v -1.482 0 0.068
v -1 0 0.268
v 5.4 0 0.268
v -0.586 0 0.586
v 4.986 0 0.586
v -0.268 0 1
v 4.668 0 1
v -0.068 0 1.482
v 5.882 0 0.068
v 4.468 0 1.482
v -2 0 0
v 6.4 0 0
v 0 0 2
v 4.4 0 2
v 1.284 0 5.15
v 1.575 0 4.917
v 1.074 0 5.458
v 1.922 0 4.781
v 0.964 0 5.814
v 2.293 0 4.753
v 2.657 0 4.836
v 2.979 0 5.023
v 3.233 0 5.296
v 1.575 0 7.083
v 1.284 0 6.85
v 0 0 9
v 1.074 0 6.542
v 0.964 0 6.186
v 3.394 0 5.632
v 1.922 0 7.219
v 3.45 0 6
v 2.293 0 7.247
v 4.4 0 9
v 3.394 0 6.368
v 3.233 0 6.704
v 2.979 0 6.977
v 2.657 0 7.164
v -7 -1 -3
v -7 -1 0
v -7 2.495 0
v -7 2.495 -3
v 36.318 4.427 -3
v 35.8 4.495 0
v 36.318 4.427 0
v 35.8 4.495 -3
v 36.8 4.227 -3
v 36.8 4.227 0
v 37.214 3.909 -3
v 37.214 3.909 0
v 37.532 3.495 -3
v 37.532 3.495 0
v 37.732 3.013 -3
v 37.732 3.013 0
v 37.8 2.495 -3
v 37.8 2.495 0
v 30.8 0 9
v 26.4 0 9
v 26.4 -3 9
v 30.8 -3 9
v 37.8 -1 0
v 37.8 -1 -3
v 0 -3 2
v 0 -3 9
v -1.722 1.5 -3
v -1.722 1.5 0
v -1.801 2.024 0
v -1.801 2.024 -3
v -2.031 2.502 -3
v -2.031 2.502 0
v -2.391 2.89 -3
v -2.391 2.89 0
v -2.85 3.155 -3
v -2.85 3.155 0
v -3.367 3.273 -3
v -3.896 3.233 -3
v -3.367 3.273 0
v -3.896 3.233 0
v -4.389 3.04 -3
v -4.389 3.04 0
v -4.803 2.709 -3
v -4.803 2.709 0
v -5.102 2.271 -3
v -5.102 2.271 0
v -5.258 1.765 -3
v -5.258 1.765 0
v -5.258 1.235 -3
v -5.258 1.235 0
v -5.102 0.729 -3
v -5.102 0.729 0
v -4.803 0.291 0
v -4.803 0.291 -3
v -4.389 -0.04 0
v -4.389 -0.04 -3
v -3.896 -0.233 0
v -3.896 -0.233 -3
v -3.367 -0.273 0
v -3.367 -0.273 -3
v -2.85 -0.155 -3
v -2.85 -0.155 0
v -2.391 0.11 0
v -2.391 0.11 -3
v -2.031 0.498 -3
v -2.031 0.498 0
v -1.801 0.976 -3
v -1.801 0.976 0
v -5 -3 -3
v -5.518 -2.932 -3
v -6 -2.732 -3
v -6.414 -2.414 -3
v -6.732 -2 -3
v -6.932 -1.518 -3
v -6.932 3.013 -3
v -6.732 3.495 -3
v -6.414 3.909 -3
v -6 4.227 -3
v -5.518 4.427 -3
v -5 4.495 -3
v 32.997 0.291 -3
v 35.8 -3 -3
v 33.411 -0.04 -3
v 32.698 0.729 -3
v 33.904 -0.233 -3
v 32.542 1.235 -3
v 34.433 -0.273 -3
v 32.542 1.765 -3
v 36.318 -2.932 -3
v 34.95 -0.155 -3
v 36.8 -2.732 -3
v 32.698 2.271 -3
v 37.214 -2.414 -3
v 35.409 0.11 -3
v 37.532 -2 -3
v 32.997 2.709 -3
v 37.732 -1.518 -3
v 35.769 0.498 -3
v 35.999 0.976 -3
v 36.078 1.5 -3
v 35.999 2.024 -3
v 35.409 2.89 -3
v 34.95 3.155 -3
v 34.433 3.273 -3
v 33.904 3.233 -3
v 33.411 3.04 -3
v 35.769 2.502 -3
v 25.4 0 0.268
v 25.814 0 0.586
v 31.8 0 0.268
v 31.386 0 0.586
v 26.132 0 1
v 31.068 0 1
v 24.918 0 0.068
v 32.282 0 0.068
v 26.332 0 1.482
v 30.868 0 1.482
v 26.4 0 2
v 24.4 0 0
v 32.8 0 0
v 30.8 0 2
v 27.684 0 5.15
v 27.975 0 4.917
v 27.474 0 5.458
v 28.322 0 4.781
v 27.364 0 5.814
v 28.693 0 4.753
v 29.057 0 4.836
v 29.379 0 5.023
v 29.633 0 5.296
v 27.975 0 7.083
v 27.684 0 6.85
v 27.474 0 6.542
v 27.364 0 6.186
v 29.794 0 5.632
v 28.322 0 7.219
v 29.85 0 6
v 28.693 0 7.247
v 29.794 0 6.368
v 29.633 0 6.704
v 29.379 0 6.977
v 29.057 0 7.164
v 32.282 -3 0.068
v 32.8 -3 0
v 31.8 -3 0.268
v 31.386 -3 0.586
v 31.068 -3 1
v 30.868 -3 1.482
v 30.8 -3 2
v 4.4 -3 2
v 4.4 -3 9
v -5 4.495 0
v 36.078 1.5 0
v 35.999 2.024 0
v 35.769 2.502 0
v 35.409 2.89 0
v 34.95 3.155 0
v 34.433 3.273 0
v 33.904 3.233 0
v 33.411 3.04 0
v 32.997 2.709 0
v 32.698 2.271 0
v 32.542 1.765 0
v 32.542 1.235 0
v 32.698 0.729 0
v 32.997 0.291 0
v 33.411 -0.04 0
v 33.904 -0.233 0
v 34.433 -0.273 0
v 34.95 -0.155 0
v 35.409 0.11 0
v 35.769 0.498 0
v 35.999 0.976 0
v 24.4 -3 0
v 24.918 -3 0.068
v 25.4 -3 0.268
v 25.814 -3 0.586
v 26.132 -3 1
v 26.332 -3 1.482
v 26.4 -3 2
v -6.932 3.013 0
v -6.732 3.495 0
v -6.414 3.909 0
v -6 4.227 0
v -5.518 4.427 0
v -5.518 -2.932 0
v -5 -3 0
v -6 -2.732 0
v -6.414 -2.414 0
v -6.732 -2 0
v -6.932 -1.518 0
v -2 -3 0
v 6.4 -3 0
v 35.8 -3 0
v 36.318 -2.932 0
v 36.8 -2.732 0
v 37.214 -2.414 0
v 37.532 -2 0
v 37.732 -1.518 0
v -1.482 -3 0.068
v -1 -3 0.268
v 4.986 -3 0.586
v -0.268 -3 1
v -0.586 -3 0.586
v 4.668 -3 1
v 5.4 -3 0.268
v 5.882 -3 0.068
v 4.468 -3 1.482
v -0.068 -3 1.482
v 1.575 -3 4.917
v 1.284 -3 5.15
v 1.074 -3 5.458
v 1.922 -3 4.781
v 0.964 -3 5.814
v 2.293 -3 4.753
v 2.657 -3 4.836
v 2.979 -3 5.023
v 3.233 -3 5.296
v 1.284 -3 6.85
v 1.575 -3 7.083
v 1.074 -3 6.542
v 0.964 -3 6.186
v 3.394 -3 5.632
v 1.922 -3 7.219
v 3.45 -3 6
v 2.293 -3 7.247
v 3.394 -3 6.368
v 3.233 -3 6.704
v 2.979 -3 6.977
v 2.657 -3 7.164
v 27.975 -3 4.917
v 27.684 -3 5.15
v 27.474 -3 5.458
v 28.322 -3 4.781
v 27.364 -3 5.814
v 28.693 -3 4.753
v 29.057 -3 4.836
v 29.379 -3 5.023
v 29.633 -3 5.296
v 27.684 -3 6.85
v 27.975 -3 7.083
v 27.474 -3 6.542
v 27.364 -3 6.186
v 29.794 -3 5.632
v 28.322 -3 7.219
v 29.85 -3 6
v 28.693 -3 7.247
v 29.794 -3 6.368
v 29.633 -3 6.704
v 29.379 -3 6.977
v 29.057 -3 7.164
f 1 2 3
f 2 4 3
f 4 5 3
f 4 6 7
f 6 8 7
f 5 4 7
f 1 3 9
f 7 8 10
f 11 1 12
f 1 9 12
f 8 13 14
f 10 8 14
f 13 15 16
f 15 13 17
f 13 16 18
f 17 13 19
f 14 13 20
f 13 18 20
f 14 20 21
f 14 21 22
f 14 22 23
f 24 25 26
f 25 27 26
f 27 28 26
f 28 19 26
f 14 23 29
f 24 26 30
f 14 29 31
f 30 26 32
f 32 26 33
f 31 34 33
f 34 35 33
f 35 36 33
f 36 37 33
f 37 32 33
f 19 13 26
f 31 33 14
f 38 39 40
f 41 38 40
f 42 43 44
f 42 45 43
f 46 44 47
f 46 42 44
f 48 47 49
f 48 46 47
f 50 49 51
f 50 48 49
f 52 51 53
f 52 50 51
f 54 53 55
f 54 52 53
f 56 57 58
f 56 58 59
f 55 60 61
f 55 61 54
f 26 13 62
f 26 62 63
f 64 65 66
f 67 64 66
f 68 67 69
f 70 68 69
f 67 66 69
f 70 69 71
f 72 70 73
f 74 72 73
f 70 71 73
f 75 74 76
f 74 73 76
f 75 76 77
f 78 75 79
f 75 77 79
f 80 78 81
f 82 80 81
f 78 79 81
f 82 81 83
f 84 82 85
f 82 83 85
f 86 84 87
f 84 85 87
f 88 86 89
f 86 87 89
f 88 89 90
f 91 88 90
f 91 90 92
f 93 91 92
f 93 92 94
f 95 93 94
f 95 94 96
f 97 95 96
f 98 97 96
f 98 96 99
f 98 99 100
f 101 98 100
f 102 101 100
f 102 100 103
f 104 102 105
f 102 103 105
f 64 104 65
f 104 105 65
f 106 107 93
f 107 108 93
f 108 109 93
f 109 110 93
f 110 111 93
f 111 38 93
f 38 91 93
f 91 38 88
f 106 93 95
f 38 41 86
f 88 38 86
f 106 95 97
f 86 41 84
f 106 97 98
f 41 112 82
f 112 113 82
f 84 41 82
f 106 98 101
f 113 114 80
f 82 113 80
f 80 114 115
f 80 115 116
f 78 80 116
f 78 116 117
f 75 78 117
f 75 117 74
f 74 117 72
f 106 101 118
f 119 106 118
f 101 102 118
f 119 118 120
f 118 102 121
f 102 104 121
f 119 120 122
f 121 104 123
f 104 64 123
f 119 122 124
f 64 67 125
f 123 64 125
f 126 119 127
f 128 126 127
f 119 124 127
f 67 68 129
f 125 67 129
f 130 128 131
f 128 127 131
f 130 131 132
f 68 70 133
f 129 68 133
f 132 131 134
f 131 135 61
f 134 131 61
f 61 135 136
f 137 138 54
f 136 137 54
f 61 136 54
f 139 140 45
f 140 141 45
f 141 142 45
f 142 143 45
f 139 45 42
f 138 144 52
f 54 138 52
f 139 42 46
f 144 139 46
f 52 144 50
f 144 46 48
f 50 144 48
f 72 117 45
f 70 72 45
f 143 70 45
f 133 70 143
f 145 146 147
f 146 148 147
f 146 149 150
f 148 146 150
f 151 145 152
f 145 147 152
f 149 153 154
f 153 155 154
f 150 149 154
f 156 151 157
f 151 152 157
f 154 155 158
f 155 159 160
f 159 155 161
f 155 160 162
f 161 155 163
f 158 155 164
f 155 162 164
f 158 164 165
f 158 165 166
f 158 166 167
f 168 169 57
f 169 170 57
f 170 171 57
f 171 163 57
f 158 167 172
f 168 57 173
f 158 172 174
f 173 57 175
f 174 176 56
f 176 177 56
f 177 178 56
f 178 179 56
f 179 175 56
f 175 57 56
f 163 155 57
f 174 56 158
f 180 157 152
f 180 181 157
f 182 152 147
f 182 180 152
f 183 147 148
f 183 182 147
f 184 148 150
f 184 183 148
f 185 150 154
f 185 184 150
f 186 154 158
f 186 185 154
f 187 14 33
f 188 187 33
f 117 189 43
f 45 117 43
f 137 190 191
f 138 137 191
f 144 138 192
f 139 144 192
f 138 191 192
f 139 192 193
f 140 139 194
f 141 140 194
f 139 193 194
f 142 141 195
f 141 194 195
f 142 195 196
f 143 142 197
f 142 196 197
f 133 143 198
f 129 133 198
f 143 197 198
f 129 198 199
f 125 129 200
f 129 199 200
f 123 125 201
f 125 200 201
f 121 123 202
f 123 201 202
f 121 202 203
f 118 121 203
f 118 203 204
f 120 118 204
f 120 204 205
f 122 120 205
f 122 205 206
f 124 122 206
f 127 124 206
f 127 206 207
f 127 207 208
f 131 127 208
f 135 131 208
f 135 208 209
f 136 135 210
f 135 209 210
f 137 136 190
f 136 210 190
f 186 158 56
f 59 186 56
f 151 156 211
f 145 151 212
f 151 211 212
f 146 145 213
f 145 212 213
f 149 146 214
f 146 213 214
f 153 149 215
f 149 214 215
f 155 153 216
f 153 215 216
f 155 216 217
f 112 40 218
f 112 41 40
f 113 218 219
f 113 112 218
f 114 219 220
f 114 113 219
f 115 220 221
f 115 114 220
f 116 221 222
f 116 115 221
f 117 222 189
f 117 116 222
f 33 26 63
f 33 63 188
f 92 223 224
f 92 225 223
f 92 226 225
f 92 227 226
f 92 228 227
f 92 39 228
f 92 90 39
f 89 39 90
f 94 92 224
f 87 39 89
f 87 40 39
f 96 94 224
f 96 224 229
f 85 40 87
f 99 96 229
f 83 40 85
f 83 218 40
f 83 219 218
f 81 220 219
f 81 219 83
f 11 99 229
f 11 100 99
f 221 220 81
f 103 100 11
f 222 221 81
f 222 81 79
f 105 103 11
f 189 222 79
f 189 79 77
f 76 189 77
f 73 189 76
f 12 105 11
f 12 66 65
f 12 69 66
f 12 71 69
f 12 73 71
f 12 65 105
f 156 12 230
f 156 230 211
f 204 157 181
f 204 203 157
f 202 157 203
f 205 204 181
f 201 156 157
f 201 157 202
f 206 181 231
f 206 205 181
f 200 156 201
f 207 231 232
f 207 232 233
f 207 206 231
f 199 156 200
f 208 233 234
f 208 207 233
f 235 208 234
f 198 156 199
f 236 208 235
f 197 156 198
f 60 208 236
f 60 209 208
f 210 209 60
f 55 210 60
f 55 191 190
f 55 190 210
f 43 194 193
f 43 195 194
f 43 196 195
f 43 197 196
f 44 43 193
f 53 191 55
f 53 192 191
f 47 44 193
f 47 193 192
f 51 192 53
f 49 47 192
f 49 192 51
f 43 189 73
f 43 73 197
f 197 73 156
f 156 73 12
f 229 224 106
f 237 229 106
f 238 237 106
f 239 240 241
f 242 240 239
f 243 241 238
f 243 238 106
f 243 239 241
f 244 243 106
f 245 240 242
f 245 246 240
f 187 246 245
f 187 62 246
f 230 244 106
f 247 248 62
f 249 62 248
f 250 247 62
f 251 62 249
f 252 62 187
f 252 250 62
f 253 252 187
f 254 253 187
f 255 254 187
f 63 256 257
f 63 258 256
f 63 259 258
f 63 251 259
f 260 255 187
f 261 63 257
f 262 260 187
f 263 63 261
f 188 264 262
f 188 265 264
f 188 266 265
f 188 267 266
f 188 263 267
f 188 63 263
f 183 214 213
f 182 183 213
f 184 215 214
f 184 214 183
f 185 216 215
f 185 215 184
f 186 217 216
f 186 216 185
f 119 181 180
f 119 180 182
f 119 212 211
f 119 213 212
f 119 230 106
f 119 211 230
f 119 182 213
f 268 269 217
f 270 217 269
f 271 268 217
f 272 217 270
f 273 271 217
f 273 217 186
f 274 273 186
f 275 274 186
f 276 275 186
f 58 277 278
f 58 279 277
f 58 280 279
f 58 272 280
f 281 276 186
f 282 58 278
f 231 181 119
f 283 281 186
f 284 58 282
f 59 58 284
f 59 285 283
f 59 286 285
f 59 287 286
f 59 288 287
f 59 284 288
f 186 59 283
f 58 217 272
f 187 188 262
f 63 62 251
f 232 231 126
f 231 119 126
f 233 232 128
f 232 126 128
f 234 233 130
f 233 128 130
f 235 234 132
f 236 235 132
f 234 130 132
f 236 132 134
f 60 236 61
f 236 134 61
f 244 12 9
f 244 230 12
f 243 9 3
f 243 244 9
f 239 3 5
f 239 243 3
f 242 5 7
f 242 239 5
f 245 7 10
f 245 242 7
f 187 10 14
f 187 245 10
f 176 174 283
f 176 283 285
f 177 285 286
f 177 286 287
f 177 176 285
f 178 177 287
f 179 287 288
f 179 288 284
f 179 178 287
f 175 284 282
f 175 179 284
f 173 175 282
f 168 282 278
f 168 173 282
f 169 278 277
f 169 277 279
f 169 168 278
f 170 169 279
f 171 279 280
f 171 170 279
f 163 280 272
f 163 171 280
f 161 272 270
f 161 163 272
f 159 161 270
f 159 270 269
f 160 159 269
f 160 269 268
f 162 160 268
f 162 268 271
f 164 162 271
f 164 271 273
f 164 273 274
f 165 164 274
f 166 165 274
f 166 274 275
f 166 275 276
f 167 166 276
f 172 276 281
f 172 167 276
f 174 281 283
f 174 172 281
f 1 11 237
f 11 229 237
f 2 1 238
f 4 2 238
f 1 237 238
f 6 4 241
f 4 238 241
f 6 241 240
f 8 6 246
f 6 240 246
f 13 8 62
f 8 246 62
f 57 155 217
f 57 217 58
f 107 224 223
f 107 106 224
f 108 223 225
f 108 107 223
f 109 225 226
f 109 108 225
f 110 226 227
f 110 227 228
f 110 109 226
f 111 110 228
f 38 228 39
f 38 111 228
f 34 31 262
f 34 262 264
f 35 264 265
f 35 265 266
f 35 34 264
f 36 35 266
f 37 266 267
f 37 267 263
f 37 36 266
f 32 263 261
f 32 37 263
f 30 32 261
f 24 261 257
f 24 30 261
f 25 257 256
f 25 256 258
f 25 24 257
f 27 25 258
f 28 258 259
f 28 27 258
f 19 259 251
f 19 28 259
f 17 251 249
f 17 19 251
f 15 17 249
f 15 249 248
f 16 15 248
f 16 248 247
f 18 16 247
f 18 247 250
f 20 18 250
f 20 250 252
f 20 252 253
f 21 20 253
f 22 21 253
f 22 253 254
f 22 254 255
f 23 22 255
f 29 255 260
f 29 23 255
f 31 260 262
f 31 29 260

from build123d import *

# Parameters (mm, degrees)
F0_W     = 4.4
F0_H     = 9
F0_R     = 1.25
F1_DEPTH = 3
F2_W     = 44.8
F2_H     = 7.4952778638
F2_R     = 1.778
F3_DEPTH = 3
F4_R     = 2
F5_R     = 2


with BuildPart() as f1:
    # F0 (on Front) → F1 (new body)
    with BuildSketch(Plane.XZ):
        with Locations((2.2, 4.5)):
            Rectangle(F0_W, F0_H)
        with Locations((2.2, 6)):
            Circle(F0_R, mode=Mode.SUBTRACT)
    extrude(amount=F1_DEPTH)



with BuildPart() as f1b:
    # F0 (on Front) → F1, piece 2 (new body)
    with BuildSketch(Plane.XZ):
        with Locations((28.6, 4.5)):
            Rectangle(F0_W, F0_H)
        with Locations((28.6, 6)):
            Circle(F0_R, mode=Mode.SUBTRACT)
    extrude(amount=F1_DEPTH)


with BuildPart() as f1_1:
    add(f1.part)

    add(f1b.part)  # F3 merges F1b
    # F2 (on Top) → F3 (join)
    with BuildSketch(Plane.XY):
        with Locations((15.4, 0.7476389319)):
            Rectangle(F2_W, F2_H)
        with Locations((-3.5, 1.5)):
            Circle(F2_R, mode=Mode.SUBTRACT)
        with Locations((34.3, 1.5)):
            Circle(F2_R, mode=Mode.SUBTRACT)
    extrude(amount=-F3_DEPTH)

    # F4
    f4_edges = [f1_1.edges().sort_by_distance(p)[0] for p in [
        (0, -1.5, 0),
        (4.4, -1.5, 0),
        (26.4, -1.5, 0),
        (30.8, -1.5, 0),
    ]]
    fillet(f4_edges, radius=F4_R)

    # F5
    f5_edges = [f1_1.edges().sort_by_distance(p)[0] for p in [
        (-7, -3, -1.5),
        (-7, 4.495278, -1.5),
        (37.8, -3, -1.5),
        (37.8, 4.495278, -1.5),
    ]]
    fillet(f5_edges, radius=F5_R)


solid = f1_1.part
